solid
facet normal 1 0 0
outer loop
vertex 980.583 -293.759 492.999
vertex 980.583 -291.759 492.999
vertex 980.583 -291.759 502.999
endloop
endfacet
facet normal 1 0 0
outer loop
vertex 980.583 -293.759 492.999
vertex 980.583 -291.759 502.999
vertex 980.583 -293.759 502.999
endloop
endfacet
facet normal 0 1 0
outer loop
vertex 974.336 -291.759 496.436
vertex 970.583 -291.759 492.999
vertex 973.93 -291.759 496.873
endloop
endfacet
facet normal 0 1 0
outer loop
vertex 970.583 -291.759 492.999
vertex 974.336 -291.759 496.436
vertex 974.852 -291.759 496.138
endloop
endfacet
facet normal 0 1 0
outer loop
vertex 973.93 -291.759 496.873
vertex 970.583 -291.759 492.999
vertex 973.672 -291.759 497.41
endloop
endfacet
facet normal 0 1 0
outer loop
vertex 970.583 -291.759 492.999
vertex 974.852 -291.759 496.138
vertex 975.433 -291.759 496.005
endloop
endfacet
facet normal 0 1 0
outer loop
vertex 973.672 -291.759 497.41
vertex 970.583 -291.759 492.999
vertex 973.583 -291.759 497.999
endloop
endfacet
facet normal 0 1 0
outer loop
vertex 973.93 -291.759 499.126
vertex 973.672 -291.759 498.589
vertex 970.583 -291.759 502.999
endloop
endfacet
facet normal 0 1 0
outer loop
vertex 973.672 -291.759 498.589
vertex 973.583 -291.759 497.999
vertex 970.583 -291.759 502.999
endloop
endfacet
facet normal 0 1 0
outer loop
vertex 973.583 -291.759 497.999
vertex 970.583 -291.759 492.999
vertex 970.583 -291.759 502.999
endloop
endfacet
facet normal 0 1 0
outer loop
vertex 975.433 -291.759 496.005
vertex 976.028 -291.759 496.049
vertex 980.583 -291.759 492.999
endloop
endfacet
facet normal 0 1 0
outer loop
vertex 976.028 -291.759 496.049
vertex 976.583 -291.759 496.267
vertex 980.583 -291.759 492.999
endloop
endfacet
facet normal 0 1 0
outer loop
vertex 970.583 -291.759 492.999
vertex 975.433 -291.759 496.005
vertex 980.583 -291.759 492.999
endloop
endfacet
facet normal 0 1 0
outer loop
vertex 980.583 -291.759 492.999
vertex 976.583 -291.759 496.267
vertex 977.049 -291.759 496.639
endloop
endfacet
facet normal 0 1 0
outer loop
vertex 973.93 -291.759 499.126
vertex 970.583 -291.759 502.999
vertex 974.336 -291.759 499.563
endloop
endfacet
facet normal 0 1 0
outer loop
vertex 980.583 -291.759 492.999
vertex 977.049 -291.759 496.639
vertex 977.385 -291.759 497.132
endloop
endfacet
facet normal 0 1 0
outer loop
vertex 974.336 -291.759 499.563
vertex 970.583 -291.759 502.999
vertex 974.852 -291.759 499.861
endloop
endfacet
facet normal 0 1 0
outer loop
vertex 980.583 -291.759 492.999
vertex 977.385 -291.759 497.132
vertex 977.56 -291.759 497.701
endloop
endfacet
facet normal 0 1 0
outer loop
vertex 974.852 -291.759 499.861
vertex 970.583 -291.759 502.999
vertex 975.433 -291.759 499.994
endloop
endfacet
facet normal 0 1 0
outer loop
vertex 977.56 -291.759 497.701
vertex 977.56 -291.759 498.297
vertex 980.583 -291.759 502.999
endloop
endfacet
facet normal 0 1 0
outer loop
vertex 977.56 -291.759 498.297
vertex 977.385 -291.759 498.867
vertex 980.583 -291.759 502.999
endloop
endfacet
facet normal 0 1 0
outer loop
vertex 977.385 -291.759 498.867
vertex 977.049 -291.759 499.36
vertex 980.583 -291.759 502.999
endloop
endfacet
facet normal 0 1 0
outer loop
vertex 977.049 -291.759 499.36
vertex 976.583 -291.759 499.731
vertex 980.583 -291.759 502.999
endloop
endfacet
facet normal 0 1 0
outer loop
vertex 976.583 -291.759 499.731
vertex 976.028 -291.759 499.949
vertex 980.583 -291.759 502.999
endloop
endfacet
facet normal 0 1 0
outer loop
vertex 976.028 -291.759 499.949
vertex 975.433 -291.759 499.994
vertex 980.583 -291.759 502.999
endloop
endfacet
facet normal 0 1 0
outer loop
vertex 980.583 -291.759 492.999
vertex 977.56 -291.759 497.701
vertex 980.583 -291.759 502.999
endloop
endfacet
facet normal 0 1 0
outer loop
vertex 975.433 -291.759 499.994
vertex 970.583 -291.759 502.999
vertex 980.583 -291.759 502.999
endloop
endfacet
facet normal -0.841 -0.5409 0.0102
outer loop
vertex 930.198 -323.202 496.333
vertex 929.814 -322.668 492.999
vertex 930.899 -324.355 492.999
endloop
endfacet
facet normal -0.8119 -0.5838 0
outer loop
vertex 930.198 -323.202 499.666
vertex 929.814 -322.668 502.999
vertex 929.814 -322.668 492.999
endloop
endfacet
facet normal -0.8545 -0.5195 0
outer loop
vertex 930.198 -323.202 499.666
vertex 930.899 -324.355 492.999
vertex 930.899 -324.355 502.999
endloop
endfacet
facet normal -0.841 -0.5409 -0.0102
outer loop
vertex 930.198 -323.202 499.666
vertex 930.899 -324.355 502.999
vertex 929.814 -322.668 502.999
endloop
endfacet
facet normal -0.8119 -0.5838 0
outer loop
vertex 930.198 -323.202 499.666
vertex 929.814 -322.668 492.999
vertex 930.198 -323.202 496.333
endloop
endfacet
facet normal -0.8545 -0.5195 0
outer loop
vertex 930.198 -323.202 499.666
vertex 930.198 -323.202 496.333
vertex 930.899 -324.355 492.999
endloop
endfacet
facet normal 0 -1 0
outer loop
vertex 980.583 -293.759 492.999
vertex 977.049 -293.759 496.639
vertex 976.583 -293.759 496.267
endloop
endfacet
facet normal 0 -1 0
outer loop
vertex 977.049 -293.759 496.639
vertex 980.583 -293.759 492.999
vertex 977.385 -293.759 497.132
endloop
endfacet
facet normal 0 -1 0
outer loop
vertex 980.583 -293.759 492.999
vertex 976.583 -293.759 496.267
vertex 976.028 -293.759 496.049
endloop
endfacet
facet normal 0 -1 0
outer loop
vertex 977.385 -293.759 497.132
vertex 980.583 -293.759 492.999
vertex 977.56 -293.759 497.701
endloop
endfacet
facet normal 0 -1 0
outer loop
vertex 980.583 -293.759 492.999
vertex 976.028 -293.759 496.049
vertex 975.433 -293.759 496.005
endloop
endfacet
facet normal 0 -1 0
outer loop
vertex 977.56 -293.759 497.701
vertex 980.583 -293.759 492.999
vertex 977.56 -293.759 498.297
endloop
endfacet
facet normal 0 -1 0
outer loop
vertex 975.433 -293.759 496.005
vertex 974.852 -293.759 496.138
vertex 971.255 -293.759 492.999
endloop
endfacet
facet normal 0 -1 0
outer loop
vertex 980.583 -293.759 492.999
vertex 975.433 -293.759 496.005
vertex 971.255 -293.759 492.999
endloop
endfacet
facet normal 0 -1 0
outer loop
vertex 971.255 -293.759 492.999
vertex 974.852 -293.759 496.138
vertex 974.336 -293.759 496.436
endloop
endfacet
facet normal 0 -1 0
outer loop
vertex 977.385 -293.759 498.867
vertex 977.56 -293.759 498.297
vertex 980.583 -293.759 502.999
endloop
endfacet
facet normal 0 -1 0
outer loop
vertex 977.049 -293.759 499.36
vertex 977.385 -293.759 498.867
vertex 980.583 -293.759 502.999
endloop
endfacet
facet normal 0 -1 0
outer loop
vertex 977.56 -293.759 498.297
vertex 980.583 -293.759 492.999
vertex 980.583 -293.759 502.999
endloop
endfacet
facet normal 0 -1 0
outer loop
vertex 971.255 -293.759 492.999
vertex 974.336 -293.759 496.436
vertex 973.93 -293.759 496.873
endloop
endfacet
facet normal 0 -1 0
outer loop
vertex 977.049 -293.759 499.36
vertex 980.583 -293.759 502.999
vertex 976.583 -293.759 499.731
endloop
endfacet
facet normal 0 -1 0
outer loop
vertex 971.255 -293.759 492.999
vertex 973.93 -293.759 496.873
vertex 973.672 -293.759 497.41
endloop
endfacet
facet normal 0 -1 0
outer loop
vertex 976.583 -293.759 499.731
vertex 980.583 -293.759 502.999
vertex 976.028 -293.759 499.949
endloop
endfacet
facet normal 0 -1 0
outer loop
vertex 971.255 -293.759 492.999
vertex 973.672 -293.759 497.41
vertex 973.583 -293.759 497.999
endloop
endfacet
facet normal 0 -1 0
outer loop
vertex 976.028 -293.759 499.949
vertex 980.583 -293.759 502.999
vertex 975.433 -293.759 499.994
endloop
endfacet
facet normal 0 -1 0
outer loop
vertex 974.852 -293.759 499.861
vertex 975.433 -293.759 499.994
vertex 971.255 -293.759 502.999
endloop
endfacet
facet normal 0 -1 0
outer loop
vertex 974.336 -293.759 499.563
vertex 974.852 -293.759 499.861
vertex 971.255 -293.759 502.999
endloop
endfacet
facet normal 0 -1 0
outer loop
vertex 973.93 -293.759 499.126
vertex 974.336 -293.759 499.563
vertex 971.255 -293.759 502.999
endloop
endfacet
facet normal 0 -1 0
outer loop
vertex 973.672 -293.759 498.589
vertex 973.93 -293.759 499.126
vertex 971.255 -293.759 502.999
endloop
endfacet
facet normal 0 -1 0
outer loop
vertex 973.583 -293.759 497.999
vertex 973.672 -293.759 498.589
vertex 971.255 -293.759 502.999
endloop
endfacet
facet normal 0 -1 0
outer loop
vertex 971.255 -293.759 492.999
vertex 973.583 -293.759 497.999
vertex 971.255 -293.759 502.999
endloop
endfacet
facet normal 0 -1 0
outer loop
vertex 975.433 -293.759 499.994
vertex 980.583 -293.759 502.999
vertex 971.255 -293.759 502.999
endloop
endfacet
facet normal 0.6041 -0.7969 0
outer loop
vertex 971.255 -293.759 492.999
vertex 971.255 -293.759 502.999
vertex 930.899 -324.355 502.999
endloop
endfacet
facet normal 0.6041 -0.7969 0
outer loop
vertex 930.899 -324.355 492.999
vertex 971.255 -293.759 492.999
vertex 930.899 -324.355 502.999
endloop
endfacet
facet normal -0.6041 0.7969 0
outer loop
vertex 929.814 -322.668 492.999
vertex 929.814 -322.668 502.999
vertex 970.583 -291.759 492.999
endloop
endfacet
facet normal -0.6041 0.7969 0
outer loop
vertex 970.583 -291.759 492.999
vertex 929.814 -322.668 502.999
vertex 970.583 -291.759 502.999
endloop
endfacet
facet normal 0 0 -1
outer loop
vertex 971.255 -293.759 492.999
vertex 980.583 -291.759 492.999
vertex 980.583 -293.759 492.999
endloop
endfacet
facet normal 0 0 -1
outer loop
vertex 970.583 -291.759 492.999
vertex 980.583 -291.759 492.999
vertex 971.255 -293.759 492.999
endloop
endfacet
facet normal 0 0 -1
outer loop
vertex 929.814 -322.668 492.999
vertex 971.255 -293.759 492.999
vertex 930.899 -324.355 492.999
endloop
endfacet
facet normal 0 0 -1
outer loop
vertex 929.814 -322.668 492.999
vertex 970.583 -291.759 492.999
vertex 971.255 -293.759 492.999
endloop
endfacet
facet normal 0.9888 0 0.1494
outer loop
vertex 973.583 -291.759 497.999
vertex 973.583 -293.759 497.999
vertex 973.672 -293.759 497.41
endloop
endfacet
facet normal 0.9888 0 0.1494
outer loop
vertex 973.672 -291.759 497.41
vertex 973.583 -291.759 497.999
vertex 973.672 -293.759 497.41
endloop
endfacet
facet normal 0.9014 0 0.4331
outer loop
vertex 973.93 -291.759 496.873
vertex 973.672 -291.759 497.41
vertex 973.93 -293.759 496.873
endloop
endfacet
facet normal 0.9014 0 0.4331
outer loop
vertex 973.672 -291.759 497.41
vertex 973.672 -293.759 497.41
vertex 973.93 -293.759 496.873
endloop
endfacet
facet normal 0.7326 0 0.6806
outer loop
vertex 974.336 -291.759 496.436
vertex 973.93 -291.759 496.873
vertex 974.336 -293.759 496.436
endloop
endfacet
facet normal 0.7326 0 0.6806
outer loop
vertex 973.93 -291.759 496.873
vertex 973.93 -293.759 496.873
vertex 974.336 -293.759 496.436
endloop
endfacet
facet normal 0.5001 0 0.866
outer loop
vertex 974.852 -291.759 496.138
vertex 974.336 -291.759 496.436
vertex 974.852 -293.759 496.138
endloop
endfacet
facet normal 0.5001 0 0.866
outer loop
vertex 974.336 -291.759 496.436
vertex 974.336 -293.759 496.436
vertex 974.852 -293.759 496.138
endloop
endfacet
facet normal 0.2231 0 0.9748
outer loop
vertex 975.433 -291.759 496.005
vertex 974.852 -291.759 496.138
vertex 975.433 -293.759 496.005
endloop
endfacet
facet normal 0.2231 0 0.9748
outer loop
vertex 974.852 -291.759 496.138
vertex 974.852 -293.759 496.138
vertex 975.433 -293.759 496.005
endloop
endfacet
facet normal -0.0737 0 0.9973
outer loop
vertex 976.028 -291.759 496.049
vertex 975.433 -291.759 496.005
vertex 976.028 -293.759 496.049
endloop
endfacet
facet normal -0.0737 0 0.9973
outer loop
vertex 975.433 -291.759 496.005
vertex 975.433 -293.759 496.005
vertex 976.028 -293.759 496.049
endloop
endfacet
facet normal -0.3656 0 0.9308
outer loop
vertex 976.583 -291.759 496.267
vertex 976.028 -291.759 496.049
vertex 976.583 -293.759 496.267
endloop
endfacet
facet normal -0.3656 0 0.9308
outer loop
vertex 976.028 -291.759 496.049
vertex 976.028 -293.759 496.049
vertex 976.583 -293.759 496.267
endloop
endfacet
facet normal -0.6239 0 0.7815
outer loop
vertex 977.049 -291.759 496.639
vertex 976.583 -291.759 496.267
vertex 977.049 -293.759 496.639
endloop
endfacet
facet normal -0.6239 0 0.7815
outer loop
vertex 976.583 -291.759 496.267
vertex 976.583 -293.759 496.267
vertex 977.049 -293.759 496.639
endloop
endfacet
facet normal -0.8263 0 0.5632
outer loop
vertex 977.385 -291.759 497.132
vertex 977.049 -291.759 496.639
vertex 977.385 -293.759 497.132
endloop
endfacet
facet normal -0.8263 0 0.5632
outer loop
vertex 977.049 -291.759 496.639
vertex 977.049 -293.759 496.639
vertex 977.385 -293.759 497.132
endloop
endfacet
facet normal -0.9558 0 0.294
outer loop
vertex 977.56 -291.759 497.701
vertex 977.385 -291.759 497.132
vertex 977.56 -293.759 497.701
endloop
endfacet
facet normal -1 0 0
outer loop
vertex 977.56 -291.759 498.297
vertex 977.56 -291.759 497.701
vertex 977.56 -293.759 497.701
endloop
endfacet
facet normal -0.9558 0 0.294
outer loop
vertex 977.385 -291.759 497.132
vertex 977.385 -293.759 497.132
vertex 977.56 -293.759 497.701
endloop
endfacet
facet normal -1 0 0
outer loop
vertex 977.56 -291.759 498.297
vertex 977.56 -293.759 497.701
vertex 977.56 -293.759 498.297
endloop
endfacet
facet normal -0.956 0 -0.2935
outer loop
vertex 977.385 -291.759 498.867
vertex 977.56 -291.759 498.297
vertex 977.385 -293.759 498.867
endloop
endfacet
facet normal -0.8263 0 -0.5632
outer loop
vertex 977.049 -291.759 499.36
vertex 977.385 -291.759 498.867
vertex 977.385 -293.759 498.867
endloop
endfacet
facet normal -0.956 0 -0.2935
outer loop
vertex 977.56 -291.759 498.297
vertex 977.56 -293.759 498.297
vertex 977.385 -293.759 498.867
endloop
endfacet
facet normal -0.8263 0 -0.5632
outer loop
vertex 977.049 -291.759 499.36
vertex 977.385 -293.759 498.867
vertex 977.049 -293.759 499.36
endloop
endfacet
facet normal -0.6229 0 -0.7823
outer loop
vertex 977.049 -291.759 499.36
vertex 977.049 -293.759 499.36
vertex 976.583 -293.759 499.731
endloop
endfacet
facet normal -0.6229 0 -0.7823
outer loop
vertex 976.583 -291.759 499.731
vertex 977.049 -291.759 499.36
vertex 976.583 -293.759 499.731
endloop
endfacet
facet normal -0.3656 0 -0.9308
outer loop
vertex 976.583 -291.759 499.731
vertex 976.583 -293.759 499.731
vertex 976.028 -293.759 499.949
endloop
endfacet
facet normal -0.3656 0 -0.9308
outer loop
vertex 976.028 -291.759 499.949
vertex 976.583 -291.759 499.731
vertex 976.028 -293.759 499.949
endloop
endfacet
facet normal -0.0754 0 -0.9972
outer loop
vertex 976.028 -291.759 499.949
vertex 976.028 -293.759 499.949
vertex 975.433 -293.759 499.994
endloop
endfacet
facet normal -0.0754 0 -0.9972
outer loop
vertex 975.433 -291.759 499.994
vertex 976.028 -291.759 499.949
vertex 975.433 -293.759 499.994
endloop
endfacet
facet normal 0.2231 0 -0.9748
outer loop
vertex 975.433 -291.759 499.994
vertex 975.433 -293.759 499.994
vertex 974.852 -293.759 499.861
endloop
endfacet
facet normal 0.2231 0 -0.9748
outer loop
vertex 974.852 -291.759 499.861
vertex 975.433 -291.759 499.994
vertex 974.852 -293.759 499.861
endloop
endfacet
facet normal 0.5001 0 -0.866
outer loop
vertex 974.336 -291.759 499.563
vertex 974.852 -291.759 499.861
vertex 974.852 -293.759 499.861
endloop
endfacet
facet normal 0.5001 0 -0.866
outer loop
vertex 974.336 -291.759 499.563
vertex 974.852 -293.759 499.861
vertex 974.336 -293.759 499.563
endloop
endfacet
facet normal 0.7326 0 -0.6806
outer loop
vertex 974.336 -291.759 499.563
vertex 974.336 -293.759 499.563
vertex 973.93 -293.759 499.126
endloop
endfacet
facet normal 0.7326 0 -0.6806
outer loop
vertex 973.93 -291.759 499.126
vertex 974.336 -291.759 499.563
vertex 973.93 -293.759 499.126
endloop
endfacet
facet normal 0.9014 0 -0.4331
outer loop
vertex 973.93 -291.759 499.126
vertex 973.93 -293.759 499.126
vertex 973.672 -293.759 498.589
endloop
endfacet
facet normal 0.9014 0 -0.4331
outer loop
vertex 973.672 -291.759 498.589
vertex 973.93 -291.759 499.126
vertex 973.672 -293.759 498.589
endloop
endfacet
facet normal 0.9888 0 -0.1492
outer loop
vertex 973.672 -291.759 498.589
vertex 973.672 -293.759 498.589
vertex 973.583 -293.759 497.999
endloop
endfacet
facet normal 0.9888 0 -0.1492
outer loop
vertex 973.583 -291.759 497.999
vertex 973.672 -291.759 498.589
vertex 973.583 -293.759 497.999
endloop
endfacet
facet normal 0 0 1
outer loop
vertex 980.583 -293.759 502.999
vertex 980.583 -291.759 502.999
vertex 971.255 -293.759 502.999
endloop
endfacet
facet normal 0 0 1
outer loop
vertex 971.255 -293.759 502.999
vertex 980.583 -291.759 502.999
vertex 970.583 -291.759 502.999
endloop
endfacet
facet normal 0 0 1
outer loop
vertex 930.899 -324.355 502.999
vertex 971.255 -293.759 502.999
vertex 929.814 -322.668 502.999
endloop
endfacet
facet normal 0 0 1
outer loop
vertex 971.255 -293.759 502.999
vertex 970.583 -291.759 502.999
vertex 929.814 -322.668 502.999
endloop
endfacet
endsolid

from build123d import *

# Parameters (mm, degrees)
DODANIE_WYCI_GNI_CIE1_DEPTH = 10
SZKIC2_R                    = 2
WYTNIJ_WYCI_GNI_CIE1_DEPTH  = 10


with BuildPart() as part:
    # Szkic1 → Dodanie-wyciągnięcie1 (new body)
    with BuildSketch(Plane(origin=(0, 0, 502.999346089), x_dir=(-1, 0, 0), z_dir=(0, 0, -1))):
        with BuildLine():
            Line((-929.814034739, -322.668005597), (-970.58269303, -291.759349877))
            Line((-970.58269303, -291.759349877), (-980.58269303, -291.759349877))
            Line((-980.58269303, -291.759349877), (-980.58269303, -293.759349877))
            Line((-980.58269303, -293.759349877), (-971.255135855, -293.759349877))
            Line((-971.255135855, -293.759349877), (-930.899175905, -324.355119388))
            add(Edge.make_bspline(
                [(-929.814034739, -322.668005597), (-930.214433706, -323.196133667), (-930.577577349, -323.759219062), (-930.899175905, -324.355119388)],
                knots=[0.163263648, 0.163263648, 0.163263648, 0.163263648, 0.18460997, 0.18460997, 0.18460997, 0.18460997], degree=3, weights=[0.560185558, 0.55031088, 0.54165131, 0.534206848]))
        make_face()
    extrude(amount=DODANIE_WYCI_GNI_CIE1_DEPTH)

    # Szkic2 → Wytnij-wyciągnięcie1 (cut)
    with BuildSketch(Plane(origin=(0, -293.759349877, 0), x_dir=(-1, 0, 0), z_dir=(0, -1, 0))):
        with Locations((-975.58269303, -497.999346089)):
            Circle(SZKIC2_R)
    extrude(amount=-WYTNIJ_WYCI_GNI_CIE1_DEPTH, mode=Mode.SUBTRACT)


solid = part.part
